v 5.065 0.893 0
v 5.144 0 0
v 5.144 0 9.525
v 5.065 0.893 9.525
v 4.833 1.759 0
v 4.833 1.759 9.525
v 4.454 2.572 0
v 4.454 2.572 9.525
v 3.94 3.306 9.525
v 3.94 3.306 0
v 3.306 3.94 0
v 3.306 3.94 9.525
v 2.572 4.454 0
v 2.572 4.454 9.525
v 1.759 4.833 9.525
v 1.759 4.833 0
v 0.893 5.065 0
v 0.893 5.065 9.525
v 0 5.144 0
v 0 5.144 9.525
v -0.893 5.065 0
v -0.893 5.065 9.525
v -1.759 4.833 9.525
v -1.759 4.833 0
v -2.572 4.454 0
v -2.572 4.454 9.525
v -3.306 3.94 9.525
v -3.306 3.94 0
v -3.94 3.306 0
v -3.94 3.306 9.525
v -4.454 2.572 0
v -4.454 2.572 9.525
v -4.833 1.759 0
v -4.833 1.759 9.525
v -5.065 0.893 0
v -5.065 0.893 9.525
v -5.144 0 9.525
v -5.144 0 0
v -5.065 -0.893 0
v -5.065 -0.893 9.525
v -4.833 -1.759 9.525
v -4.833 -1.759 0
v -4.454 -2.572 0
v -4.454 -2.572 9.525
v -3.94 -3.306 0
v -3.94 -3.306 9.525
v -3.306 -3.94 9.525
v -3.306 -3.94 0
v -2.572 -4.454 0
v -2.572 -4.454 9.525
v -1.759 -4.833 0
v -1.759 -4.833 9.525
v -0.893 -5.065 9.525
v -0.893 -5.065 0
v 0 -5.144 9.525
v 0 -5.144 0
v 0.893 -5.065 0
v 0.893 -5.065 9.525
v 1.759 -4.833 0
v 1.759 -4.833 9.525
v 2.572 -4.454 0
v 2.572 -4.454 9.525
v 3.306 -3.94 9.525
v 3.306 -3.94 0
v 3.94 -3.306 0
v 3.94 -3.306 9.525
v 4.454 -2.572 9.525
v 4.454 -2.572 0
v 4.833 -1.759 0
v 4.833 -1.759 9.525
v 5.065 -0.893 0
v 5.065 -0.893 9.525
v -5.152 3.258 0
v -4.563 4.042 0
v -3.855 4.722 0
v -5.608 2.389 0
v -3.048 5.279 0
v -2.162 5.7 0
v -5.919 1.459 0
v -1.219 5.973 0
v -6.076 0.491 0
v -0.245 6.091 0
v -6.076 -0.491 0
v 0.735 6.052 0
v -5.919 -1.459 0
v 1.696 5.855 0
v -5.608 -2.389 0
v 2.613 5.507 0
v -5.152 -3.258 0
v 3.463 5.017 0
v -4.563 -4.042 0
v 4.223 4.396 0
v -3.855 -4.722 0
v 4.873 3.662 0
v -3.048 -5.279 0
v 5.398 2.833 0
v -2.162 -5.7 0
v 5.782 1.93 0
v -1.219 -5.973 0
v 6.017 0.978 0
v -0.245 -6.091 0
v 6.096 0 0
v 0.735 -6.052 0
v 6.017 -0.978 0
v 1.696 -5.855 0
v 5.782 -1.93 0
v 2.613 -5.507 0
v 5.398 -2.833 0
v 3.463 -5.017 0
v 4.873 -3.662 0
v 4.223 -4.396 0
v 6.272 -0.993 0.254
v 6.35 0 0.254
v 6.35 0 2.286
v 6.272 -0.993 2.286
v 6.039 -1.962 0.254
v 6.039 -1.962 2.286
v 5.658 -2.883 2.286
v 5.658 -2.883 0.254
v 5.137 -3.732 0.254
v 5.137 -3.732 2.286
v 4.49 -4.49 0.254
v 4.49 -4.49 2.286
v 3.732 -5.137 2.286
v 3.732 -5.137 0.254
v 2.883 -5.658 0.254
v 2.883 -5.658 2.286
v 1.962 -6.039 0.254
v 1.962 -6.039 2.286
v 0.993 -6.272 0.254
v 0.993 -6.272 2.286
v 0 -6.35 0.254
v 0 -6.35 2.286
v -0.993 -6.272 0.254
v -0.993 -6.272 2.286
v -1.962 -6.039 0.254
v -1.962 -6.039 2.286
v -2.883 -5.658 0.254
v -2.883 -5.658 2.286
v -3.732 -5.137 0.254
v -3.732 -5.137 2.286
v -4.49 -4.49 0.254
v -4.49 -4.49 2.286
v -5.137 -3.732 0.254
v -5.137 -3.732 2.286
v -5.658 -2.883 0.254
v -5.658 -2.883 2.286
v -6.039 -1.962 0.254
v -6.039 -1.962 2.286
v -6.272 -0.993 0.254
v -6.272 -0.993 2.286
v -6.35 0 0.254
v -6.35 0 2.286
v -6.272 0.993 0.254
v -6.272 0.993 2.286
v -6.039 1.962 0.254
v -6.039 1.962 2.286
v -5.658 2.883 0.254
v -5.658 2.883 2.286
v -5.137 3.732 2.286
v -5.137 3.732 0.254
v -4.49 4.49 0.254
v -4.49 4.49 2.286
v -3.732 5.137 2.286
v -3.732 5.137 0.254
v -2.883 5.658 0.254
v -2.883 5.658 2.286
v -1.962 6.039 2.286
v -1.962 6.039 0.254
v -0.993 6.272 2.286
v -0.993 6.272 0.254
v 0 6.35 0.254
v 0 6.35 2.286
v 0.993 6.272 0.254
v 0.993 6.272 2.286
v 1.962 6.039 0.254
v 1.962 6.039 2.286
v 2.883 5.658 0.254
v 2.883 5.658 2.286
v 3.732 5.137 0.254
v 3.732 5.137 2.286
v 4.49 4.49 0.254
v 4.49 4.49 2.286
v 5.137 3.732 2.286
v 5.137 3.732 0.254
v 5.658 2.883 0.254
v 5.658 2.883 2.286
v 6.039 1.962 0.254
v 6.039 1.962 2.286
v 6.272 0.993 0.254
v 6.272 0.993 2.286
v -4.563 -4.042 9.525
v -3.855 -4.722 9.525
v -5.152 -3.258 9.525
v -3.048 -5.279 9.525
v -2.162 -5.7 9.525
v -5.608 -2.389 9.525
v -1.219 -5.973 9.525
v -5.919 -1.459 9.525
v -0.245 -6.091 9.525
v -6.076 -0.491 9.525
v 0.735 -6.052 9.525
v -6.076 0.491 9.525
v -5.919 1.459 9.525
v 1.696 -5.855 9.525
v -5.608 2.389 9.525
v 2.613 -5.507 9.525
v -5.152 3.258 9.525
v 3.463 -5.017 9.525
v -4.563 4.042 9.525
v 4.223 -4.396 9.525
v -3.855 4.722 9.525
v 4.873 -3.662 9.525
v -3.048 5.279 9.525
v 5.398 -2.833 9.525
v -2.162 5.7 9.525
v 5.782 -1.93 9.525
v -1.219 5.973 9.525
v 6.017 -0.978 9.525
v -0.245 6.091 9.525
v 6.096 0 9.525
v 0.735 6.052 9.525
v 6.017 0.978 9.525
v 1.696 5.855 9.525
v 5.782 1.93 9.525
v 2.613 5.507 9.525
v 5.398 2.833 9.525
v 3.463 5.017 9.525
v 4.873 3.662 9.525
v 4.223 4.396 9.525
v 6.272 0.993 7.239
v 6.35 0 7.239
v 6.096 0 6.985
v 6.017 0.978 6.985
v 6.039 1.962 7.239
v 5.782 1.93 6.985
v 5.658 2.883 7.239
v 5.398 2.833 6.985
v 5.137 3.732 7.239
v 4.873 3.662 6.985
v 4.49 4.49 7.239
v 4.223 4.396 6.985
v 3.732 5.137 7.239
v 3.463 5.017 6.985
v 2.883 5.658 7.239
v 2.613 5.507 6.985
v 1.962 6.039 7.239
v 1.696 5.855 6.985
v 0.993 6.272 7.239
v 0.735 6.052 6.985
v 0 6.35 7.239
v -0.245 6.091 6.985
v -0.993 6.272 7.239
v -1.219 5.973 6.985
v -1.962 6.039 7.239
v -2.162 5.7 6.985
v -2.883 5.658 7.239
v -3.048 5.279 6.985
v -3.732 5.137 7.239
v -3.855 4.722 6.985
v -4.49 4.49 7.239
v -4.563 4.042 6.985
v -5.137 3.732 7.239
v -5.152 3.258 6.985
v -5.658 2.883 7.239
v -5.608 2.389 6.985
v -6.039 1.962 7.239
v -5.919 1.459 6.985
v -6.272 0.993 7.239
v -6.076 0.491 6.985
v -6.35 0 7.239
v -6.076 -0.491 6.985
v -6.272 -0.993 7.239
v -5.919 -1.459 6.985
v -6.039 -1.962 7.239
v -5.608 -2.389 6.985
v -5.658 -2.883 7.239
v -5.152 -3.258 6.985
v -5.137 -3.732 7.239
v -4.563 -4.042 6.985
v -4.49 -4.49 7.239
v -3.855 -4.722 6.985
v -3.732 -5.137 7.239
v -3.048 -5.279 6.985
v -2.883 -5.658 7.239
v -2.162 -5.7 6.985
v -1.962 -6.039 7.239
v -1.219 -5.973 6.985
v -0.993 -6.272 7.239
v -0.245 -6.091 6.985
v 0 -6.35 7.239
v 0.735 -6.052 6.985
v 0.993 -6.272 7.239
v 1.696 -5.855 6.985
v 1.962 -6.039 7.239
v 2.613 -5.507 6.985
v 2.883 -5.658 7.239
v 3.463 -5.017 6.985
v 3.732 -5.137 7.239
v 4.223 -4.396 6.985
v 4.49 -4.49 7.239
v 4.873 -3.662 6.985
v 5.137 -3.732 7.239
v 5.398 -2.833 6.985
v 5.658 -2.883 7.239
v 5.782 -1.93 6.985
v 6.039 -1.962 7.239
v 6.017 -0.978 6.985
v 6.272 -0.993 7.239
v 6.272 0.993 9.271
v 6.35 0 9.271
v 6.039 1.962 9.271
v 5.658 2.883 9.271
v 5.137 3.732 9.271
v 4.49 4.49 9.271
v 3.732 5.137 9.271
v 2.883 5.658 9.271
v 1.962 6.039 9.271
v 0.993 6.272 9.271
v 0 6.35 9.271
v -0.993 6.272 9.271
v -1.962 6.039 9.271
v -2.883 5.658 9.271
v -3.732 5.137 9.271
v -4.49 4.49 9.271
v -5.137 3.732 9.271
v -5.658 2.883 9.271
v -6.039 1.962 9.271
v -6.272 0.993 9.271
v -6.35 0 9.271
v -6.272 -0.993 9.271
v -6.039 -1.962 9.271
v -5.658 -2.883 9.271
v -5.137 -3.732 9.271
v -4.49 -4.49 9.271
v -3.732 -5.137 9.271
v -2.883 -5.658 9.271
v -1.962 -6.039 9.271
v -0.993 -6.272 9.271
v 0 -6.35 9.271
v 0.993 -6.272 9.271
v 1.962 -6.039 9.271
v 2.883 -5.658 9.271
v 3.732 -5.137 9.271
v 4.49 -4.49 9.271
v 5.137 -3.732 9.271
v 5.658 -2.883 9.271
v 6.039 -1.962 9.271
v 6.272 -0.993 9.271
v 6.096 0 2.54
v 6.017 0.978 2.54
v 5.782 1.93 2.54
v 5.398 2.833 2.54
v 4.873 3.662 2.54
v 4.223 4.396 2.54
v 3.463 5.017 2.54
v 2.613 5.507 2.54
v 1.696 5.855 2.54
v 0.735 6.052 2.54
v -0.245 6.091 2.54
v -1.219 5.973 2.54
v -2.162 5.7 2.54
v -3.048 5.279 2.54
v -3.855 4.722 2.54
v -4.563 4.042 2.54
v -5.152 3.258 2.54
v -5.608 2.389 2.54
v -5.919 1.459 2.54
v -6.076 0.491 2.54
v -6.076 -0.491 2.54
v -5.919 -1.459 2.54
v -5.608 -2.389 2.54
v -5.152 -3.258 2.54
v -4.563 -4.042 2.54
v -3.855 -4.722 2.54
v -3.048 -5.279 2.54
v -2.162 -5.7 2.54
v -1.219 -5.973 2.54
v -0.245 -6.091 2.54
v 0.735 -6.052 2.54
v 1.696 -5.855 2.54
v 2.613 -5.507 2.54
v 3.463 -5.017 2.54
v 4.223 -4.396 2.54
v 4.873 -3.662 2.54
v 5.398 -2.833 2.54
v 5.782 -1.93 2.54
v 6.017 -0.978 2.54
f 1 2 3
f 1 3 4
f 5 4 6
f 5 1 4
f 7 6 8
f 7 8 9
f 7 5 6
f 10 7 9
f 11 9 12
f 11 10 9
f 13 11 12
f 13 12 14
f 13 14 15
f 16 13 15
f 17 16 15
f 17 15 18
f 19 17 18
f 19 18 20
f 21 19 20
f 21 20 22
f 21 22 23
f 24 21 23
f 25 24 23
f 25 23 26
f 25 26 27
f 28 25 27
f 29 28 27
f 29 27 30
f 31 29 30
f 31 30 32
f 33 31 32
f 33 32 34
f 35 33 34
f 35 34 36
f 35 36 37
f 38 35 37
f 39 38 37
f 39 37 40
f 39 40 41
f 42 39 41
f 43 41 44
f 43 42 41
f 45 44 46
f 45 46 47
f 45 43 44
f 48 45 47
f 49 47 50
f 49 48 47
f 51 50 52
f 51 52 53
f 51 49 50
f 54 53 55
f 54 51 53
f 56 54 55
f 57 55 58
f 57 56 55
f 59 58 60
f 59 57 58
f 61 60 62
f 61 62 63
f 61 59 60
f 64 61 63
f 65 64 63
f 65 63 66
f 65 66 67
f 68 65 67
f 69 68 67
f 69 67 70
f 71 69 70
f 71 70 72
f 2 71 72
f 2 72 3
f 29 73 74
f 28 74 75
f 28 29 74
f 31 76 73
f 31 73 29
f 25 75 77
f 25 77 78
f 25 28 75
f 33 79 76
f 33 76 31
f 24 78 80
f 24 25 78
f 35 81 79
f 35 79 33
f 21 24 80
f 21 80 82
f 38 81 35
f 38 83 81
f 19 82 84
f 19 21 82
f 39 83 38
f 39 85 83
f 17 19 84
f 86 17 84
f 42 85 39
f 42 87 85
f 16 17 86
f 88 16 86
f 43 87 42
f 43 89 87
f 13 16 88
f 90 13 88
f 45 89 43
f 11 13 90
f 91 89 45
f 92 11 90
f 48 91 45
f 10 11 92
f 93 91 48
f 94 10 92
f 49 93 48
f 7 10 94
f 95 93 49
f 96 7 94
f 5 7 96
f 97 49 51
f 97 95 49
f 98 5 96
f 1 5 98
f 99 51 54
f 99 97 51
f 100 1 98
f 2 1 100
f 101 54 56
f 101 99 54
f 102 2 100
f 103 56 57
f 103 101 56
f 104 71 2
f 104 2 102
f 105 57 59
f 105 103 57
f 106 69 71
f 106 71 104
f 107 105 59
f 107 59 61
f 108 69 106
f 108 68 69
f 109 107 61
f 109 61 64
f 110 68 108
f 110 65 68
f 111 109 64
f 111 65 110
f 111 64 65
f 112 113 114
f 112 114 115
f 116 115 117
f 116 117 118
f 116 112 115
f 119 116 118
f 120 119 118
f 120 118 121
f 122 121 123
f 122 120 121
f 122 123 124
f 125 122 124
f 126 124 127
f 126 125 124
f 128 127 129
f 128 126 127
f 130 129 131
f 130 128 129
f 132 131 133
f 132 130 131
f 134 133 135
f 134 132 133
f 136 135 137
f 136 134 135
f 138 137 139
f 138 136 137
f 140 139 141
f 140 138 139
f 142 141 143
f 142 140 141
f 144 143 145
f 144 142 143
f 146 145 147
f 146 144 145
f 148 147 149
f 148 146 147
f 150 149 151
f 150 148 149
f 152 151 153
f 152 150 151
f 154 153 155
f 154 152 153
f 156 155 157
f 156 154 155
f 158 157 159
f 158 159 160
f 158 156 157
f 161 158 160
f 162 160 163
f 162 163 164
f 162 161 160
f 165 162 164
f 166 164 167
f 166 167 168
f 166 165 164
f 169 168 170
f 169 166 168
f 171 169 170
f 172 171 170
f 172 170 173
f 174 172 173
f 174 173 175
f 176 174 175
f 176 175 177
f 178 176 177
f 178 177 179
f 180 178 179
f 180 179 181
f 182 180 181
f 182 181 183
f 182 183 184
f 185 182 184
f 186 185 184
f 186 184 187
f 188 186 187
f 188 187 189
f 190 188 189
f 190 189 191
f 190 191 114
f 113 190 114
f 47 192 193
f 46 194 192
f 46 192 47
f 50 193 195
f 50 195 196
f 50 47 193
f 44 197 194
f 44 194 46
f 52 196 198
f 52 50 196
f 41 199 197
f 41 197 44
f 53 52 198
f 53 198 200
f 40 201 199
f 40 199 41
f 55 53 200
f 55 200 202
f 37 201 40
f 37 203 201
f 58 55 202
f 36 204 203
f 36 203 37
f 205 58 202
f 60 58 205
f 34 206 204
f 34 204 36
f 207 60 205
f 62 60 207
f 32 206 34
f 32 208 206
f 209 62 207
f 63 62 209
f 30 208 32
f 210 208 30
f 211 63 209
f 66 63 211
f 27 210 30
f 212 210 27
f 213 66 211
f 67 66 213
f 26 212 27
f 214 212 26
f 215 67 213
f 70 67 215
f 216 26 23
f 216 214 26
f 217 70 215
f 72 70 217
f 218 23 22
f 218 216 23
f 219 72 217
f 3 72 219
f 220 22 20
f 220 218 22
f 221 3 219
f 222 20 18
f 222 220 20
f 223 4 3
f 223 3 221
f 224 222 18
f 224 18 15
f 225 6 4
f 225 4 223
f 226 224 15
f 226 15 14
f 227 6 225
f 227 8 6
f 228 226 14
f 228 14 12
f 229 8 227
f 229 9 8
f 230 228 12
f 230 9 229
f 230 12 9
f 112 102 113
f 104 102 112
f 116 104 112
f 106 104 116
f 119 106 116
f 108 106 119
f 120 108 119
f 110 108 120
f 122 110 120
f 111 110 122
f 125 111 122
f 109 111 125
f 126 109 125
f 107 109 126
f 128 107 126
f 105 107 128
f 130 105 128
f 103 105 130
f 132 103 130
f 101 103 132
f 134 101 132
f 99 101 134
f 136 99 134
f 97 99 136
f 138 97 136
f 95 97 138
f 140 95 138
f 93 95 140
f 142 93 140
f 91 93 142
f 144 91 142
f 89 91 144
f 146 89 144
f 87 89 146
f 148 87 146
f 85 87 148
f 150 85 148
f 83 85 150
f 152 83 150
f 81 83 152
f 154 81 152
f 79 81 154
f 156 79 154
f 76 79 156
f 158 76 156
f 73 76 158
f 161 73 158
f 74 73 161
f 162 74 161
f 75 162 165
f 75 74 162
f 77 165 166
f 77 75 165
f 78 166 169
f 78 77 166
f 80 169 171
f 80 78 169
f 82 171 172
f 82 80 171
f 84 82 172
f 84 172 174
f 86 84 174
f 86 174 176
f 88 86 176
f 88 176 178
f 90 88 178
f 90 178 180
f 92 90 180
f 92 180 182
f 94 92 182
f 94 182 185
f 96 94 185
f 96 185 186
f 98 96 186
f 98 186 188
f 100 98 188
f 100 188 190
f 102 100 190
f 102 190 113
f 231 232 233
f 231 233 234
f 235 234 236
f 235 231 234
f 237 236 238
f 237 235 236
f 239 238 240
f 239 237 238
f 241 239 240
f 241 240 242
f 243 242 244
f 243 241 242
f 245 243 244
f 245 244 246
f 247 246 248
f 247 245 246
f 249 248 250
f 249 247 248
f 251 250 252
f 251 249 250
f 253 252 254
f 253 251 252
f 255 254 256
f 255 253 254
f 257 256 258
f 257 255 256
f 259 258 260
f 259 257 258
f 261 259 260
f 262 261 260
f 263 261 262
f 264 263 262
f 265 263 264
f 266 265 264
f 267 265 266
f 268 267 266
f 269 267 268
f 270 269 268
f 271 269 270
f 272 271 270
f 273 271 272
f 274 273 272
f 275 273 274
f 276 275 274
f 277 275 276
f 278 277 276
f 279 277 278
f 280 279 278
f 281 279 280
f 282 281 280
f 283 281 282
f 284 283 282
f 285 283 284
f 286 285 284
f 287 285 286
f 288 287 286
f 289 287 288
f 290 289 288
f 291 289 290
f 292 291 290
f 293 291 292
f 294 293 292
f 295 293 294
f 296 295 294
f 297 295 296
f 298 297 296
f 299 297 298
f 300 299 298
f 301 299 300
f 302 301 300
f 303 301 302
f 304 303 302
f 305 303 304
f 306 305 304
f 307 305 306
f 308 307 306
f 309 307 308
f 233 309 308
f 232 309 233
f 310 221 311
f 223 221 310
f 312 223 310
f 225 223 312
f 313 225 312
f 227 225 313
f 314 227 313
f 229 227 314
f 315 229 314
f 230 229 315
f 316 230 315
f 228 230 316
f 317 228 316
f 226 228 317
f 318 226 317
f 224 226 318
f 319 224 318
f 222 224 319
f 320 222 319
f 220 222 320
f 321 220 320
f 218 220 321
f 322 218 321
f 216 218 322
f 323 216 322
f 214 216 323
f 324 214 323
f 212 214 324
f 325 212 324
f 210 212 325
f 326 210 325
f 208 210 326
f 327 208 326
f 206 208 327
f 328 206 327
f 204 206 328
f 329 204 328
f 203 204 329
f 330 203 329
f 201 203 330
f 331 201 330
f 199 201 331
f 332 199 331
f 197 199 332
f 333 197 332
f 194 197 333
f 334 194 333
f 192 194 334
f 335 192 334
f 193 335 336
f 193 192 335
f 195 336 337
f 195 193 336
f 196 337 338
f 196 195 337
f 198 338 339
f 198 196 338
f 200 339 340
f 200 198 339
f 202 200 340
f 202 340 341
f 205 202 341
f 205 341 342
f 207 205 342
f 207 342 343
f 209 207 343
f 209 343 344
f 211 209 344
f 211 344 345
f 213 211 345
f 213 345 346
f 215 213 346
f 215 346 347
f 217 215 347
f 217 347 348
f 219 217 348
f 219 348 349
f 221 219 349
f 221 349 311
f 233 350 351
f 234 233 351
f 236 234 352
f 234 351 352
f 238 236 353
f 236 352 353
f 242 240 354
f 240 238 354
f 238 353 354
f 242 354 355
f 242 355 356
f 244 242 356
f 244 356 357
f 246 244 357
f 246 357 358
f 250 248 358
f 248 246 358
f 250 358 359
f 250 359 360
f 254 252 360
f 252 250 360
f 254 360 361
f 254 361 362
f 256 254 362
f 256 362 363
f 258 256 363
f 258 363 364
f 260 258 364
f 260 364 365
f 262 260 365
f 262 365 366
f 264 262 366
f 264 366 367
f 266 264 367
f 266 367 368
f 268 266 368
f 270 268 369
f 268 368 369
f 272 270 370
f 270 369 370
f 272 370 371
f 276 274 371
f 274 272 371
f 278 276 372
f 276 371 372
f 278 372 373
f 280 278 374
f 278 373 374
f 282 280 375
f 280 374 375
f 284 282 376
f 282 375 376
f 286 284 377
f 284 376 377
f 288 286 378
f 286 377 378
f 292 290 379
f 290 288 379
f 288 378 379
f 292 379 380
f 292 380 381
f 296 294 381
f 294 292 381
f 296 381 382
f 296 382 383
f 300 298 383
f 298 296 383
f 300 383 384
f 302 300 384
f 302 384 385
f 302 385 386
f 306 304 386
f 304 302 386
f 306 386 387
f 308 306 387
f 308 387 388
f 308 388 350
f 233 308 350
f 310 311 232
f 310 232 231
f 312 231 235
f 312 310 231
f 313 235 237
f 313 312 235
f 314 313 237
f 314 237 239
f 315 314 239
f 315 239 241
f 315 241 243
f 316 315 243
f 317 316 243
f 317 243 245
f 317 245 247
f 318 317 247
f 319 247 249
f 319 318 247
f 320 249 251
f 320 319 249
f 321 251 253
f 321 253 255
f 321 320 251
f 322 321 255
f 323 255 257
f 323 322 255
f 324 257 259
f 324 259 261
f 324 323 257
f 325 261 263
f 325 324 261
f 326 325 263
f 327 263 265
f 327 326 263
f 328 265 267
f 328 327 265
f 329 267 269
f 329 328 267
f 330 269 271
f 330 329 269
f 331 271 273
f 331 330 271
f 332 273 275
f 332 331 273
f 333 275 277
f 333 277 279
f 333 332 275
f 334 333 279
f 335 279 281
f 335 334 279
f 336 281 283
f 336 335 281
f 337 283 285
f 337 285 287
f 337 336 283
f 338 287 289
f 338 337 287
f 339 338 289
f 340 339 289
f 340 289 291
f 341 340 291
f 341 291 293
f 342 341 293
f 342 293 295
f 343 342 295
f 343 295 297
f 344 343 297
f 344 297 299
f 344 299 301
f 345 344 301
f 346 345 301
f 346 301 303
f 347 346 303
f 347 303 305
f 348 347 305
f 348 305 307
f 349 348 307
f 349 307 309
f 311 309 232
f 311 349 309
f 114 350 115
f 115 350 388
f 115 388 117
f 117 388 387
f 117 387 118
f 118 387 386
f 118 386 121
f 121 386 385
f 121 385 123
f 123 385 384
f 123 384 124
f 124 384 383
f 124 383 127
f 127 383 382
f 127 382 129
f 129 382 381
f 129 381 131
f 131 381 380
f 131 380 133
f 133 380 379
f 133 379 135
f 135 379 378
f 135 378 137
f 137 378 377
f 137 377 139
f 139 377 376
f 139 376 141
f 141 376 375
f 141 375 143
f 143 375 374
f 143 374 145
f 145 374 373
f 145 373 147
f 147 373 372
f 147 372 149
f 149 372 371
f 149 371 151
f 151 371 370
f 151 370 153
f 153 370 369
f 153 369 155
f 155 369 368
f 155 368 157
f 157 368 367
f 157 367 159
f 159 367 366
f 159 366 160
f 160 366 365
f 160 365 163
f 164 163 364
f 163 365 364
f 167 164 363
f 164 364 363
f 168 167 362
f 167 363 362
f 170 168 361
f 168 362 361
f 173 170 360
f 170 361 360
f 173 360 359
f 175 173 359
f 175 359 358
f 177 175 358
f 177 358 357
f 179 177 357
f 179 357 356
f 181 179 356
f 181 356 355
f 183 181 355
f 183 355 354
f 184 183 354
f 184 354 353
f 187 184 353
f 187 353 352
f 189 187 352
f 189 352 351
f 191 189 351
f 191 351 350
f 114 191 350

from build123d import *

# Parameters (mm, degrees)
F0_R     = 6.096
F0_R_2   = 5.1435
F1_DEPTH = 9.525
F2_R     = 6.35
F2_R_2   = 5.1435
F3_DEPTH = 2.54
F4_R     = 6.35
F4_R_2   = 5.1435
F5_DEPTH = 2.54
F6_SIZE  = 0.25399


# Not quite as in the source:
# - a fillet or chamfer is up to 0.001 mm smaller than in the source, because OpenCascade refuses the exact size


with BuildPart() as f1:
    # F0 (on Top) → F1 (new body)
    with BuildSketch(Plane.XY):
        Circle(F0_R)
        Circle(F0_R_2, mode=Mode.SUBTRACT)
    extrude(amount=F1_DEPTH)

    # F2 (on face) → F3 (join)
    with BuildSketch(Plane.XY.offset(9.525)):
        Circle(F2_R)
        Circle(F2_R_2, mode=Mode.SUBTRACT)
    extrude(amount=-F3_DEPTH)

    # F4 (on face) → F5 (join)
    with BuildSketch(Plane(origin=(0, 0, 0), x_dir=(1, 0, 0), z_dir=(0, 0, -1))):
        Circle(F4_R)
        Circle(F4_R_2, mode=Mode.SUBTRACT)
    extrude(amount=-F5_DEPTH)

    # F6 (size 0.254 in the source; OpenCascade refuses exactly that, so slightly less here)
    f6_edges = [f1.edges().sort_by_distance(p)[0] for p in [
        (-6.35, 0, 6.985),
        (-6.35, 0, 9.525),
        (-6.35, 0, 2.54),
        (-6.35, 0, 0),
    ]]
    chamfer(f6_edges, length=F6_SIZE)


solid = f1.part
